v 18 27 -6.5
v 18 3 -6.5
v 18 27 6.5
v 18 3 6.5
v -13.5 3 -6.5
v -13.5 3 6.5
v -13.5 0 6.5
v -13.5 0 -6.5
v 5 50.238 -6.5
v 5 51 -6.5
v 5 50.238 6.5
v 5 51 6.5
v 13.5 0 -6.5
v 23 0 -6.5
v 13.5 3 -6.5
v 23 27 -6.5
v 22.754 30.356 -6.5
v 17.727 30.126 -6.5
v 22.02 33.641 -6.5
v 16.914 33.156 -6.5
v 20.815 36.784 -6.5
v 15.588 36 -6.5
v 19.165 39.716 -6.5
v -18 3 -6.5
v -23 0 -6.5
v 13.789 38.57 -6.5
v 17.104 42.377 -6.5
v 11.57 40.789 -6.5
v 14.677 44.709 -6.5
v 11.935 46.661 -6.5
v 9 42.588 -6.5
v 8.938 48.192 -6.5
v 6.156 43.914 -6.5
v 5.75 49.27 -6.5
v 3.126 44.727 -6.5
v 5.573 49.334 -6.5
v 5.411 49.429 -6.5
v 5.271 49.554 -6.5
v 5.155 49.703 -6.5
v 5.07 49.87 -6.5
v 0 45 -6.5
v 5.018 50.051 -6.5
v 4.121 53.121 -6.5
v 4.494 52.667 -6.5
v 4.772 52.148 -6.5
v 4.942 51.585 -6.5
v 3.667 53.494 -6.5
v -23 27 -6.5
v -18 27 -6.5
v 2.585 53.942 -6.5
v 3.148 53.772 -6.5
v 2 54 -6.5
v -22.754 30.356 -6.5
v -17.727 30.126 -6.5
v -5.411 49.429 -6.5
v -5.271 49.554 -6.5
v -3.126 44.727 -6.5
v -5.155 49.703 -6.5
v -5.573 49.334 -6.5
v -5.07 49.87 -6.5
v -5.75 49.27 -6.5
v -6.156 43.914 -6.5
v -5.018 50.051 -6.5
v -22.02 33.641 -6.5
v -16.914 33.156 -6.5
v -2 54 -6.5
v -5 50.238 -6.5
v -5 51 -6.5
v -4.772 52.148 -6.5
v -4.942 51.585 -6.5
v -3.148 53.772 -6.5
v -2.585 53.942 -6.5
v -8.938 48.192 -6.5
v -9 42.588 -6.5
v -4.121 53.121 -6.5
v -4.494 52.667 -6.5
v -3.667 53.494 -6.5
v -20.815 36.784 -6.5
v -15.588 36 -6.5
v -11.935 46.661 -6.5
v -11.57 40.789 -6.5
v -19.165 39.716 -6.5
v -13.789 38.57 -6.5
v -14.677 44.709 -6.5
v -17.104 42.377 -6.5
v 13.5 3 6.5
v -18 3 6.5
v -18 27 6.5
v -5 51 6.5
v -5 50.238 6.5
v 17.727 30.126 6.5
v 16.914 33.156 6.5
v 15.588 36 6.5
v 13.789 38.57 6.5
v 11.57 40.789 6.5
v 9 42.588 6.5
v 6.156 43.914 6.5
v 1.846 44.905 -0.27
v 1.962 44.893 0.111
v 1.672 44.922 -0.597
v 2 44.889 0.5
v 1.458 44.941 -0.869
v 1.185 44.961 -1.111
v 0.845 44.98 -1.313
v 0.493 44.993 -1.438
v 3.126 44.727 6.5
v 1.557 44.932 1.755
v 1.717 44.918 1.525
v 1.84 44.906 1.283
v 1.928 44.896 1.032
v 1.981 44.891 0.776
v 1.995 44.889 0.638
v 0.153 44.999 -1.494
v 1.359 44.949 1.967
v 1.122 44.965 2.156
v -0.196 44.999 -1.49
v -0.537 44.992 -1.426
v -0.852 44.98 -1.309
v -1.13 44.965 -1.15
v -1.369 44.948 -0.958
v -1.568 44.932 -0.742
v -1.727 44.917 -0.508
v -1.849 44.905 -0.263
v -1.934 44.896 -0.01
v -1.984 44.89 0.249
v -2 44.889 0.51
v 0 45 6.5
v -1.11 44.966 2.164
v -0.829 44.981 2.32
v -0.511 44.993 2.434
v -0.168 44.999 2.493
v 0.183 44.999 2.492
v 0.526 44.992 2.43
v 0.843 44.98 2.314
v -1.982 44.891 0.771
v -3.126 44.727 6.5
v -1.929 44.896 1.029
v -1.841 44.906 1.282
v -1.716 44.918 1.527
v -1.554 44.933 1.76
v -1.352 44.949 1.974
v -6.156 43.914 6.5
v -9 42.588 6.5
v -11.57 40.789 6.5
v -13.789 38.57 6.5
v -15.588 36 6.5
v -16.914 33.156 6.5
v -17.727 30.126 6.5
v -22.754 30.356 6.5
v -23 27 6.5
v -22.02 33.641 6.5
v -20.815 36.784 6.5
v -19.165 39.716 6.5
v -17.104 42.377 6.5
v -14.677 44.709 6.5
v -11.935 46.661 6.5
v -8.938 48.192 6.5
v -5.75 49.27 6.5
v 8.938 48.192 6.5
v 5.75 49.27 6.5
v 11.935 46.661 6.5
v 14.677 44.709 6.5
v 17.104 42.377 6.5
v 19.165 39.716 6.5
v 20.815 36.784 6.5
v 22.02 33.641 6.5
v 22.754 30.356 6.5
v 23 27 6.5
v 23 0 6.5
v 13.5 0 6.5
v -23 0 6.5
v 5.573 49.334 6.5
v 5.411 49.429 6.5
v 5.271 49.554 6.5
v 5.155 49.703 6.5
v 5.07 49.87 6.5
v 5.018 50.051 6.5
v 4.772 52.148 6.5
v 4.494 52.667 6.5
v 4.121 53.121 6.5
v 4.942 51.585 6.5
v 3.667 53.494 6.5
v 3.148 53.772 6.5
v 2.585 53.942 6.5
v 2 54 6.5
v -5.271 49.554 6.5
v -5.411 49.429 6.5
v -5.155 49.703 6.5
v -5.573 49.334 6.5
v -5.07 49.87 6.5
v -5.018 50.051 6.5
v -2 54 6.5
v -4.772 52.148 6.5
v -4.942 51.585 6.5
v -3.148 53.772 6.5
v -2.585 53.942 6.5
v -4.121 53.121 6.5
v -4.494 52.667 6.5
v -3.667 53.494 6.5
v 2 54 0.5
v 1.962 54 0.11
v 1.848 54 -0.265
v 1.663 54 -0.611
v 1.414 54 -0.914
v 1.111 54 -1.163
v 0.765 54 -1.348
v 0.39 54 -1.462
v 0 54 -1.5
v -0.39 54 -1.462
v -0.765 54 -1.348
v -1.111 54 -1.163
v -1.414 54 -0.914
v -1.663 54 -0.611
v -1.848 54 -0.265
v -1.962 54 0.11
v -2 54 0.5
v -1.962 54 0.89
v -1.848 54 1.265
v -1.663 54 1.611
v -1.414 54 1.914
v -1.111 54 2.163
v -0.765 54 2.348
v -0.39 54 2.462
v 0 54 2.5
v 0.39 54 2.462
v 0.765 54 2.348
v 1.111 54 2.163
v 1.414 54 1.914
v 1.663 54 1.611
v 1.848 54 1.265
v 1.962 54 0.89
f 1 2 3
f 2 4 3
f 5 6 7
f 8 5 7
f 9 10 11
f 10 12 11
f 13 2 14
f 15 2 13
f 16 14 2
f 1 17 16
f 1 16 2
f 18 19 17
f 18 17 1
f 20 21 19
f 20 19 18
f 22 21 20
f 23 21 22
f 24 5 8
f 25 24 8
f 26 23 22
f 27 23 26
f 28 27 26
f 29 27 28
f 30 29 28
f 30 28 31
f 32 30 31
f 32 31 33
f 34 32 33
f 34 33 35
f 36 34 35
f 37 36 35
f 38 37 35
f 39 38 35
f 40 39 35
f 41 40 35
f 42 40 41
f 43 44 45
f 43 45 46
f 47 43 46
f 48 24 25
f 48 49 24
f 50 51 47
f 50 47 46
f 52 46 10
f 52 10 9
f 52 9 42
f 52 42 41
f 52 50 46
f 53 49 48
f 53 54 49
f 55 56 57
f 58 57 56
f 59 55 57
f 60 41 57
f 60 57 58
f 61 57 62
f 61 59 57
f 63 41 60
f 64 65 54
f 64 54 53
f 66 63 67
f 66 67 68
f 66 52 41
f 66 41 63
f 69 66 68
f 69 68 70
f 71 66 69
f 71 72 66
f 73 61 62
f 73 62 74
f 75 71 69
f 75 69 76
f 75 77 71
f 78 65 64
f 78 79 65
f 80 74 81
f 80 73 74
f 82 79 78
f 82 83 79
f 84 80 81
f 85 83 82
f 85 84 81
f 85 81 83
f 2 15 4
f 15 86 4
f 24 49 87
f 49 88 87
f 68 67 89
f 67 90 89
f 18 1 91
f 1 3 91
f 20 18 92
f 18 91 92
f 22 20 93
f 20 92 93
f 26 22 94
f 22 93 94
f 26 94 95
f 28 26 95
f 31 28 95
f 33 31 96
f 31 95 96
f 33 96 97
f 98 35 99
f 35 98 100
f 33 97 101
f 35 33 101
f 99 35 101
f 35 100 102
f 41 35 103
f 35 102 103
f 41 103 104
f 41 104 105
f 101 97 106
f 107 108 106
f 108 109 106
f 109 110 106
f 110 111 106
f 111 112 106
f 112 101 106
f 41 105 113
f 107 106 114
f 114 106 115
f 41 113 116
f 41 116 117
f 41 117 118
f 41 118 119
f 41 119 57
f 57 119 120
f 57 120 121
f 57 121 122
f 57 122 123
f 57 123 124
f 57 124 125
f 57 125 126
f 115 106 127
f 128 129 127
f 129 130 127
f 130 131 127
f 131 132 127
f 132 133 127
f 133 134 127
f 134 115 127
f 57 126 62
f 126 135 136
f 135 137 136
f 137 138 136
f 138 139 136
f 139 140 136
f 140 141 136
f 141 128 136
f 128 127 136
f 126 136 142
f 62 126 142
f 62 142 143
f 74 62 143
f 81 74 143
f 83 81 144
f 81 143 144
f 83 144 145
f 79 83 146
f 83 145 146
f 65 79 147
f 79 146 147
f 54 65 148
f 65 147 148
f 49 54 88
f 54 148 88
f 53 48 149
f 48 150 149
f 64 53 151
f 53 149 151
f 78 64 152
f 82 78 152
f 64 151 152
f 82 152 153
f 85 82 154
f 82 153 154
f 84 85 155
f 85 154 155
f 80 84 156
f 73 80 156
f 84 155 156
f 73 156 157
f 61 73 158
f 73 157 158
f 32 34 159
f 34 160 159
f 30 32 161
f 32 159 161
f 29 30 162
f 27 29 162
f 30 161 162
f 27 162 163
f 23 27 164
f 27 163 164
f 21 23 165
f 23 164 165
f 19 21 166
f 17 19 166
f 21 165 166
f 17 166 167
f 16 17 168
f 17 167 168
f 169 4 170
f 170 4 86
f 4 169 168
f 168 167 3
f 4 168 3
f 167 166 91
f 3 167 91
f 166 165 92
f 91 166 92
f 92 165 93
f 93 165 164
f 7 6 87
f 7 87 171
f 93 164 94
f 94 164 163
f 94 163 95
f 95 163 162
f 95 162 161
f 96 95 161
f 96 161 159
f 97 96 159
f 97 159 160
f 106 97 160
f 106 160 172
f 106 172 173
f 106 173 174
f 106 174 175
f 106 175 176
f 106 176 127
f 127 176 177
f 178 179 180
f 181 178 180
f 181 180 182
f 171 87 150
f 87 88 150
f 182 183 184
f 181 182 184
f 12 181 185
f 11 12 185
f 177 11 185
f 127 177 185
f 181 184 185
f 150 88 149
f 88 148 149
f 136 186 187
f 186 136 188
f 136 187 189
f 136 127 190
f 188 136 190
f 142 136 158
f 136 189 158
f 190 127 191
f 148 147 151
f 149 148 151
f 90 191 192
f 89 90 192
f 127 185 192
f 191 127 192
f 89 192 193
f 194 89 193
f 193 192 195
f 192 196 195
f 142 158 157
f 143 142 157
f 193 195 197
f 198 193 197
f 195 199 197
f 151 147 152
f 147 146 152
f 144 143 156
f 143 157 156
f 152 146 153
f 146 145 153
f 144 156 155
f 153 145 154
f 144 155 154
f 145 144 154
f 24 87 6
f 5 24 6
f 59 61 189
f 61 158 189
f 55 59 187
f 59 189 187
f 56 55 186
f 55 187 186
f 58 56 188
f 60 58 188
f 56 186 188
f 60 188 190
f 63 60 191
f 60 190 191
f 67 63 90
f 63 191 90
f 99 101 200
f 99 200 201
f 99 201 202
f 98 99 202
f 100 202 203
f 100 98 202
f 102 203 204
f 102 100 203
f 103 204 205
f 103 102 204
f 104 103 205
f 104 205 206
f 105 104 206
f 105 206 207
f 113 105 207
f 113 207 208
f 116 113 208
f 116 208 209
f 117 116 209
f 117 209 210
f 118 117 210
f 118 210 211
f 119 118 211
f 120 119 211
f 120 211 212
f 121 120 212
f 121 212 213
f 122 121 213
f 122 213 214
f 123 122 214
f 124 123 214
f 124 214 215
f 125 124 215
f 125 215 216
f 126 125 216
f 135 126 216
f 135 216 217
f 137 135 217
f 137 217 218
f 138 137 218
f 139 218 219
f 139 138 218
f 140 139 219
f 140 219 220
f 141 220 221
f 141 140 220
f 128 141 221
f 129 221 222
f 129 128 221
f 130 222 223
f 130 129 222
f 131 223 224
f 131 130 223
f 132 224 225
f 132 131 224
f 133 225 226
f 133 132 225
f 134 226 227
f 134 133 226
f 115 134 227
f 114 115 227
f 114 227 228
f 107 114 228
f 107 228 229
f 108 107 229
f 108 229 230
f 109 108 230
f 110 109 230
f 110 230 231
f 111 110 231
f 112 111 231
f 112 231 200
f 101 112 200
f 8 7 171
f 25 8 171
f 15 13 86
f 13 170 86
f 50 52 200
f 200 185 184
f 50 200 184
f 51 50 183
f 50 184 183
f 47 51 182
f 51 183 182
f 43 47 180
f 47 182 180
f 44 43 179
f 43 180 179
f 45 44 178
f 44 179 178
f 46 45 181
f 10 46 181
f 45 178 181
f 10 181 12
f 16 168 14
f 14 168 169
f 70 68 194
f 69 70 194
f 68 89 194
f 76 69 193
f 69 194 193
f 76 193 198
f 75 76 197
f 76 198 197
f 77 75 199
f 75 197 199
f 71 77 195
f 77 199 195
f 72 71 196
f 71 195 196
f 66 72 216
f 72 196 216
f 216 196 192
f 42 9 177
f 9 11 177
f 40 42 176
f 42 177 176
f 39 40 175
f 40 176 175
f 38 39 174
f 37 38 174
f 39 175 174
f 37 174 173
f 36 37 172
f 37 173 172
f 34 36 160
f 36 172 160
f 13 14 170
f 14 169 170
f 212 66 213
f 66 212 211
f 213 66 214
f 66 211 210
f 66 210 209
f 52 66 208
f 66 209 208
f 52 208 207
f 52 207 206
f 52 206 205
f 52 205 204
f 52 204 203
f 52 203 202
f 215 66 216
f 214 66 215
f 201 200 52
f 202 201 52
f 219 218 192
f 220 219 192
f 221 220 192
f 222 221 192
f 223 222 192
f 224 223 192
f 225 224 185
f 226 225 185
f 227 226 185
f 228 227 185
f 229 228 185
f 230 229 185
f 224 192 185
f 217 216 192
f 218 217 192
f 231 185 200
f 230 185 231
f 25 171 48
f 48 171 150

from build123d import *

# Parameters (mm, degrees)
BOSS_EXTRUDE2_DEPTH = 6.5
CUT_EXTRUDE1_START  = 44.888544
SKETCH3_R           = 2
CUT_EXTRUDE1_DEPTH  = 9.111456


with BuildPart() as part:
    # Sketch1 → Boss-Extrude2 (new body, symmetric)
    with BuildSketch(Plane.XY):
        with BuildLine():
            Line((-13.5, 0), (-23, 0))
            Line((-23, 0), (-23, 27))
            ThreePointArc((-23, 27), (-18.183096546, 41.084566021), (-5.75, 49.269654241))
            ThreePointArc((-5.75, 49.269654241), (-5.209430585, 49.625527642), (-5, 50.237900077))
            Line((-5, 50.237900077), (-5, 51))
            ThreePointArc((-5, 51), (-4.121320344, 53.121320344), (-2, 54))
            Line((-2, 54), (2, 54))
            ThreePointArc((2, 54), (4.121320344, 53.121320344), (5, 51))
            Line((5, 51), (5, 50.237900077))
            ThreePointArc((5, 50.237900077), (5.209430585, 49.625527642), (5.75, 49.269654241))
            ThreePointArc((5.75, 49.269654241), (18.183096546, 41.084566021), (23, 27))
            Line((23, 27), (23, 0))
            Line((23, 0), (13.5, 0))
            Line((13.5, 0), (13.5, 3))
            Line((13.5, 3), (18, 3))
            Line((18, 3), (18, 27))
            ThreePointArc((18, 27), (12.727922061, 39.727922061), (0, 45))
            ThreePointArc((0, 45), (-12.727922061, 39.727922061), (-18, 27))
            Line((-18, 27), (-18, 3))
            Line((-18, 3), (-13.5, 3))
            Line((-13.5, 3), (-13.5, 0))
        make_face()
    extrude(amount=BOSS_EXTRUDE2_DEPTH, both=True)

    # Sketch3 → Cut-Extrude1 (cut)
    with BuildSketch(Plane(origin=(0, 0, 0), x_dir=(1, 0, 0), z_dir=(0, 1, 0)).offset(CUT_EXTRUDE1_START)):
        with Locations((0, -0.5)):
            Circle(SKETCH3_R)
    extrude(amount=CUT_EXTRUDE1_DEPTH, mode=Mode.SUBTRACT)


solid = part.part
